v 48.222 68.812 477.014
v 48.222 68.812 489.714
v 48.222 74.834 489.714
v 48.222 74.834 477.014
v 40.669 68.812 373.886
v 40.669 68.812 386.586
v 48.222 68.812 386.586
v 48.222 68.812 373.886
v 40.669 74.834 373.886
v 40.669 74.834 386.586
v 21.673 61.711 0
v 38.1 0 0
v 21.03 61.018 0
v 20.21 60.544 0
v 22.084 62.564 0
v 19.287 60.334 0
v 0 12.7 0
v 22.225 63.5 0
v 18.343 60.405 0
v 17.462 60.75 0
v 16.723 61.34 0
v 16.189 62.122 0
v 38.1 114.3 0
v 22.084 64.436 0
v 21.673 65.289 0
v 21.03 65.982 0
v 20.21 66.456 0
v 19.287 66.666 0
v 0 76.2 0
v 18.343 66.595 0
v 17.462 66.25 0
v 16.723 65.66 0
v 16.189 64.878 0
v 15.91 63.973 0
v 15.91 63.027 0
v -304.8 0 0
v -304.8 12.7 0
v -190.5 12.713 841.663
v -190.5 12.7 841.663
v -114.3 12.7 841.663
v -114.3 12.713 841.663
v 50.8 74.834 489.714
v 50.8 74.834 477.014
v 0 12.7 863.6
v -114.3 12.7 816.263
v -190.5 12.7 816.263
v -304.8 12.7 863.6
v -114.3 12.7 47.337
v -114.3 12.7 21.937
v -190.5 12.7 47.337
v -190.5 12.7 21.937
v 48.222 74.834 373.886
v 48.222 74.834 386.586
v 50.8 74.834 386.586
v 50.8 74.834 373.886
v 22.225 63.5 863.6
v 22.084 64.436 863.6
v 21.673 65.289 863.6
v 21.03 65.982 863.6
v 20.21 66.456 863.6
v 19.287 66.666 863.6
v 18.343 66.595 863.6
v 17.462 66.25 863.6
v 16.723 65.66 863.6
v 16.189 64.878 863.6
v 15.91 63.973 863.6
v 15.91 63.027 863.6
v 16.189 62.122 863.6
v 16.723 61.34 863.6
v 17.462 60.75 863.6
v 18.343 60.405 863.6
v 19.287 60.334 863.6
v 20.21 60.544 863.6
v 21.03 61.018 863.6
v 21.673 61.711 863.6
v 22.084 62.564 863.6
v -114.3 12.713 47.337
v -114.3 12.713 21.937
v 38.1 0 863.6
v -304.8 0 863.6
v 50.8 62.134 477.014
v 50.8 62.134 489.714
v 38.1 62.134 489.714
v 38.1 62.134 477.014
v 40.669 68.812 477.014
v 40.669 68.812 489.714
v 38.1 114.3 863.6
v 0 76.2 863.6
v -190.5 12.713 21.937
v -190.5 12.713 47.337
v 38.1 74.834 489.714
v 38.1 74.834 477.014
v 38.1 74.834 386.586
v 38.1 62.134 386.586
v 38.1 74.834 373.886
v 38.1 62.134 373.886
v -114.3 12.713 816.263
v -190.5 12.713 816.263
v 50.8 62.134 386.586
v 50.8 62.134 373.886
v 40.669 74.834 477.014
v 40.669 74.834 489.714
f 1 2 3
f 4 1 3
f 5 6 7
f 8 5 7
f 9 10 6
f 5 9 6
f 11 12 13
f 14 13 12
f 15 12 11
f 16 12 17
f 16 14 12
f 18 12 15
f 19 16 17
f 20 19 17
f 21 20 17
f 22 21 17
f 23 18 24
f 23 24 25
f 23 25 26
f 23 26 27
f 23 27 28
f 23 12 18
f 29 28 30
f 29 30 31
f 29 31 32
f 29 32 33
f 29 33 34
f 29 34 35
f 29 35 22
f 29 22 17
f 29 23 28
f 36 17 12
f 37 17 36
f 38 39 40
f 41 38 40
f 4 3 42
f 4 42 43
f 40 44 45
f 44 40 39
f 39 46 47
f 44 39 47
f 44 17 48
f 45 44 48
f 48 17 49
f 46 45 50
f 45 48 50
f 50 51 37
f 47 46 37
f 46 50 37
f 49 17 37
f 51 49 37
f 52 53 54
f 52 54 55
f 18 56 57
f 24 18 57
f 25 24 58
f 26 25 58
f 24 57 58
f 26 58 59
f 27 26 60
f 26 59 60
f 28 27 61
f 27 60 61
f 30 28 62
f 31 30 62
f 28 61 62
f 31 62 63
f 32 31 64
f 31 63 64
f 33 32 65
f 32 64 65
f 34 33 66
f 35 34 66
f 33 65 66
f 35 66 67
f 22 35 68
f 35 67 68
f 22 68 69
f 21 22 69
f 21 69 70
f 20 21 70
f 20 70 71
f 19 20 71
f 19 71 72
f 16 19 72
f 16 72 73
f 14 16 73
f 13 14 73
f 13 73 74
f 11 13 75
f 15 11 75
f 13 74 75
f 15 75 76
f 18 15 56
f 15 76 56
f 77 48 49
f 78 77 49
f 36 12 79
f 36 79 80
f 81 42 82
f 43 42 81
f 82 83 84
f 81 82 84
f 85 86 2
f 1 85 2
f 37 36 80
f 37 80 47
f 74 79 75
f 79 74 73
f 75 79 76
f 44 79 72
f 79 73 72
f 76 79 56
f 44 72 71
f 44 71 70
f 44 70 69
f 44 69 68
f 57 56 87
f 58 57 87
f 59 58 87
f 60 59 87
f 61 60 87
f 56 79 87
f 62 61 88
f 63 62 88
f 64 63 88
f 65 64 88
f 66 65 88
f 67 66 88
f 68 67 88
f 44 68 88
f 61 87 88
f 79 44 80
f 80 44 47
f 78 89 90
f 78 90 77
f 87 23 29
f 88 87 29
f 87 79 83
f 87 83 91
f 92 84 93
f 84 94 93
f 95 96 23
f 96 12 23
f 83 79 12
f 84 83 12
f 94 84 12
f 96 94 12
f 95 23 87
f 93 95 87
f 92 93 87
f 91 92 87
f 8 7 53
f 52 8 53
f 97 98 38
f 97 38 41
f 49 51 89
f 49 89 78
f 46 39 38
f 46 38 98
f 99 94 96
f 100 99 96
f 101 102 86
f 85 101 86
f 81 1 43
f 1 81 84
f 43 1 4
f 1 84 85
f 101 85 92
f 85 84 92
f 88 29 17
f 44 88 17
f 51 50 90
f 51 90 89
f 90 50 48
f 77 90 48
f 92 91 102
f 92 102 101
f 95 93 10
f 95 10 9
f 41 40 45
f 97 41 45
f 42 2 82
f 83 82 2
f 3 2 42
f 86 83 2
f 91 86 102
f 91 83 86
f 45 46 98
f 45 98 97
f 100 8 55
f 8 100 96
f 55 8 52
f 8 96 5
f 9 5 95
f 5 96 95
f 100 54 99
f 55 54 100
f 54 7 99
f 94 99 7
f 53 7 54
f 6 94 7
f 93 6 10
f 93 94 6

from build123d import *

# Parameters (mm, degrees)
BOSS_EXTRUDE1_DEPTH = 863.6
SKETCH3_R           = 3.175
CUT_EXTRUDE1_DEPTH  = 863.6
SKETCH2_W           = 304.8
SKETCH2_H           = 12.7
BOSS_EXTRUDE5_DEPTH = 863.6
SKETCH5_W           = 76.2
SKETCH5_H           = 25.4
BOSS_EXTRUDE6_DEPTH = 0.0127
SKETCH6_W           = 12.7
SKETCH6_H           = 12.7
BOSS_EXTRUDE8_DEPTH = 12.7
CUT_EXTRUDE2_DEPTH  = 137.668


with BuildPart() as part:
    # Sketch1 → Boss-Extrude1 (new body)
    with BuildSketch(Plane.XY):
        Polygon((0, 0), (38.1, 0), (38.1, 114.3), (19.716081556, 95.916081556), (0, 76.2), align=None)
    extrude(amount=BOSS_EXTRUDE1_DEPTH)

    # Sketch3 → Cut-Extrude1 (cut)
    with BuildSketch(Plane.XY.offset(863.6)):
        with Locations((19.05, 63.5)):
            Circle(SKETCH3_R)
    extrude(amount=-CUT_EXTRUDE1_DEPTH, mode=Mode.SUBTRACT)

    # Sketch2 → Boss-Extrude5 (add)
    with BuildSketch(Plane(origin=(0, 0, 0), x_dir=(-1, 0, 0), z_dir=(0, 0, -1))):
        with Locations((152.4, 6.35)):
            Rectangle(SKETCH2_W, SKETCH2_H)
    extrude(amount=-BOSS_EXTRUDE5_DEPTH)

    # Sketch5 → Boss-Extrude6 (add)
    with BuildSketch(Plane(origin=(0, 12.7, 0), x_dir=(1, 0, 0), z_dir=(0, 1, 0))):
        with Locations((-152.4, -34.636758867)):
            Rectangle(SKETCH5_W, SKETCH5_H)
        with Locations((-152.4, -828.963241133)):
            Rectangle(SKETCH5_W, SKETCH5_H)
    extrude(amount=BOSS_EXTRUDE6_DEPTH)

    # Sketch6 → Boss-Extrude8 (add)
    with BuildSketch(Plane(origin=(38.1, 0, 0), x_dir=(0, 0, -1), z_dir=(1, 0, 0))):
        with Locations((-380.236111085, 68.484263382)):
            Rectangle(SKETCH6_W, SKETCH6_H)
        with Locations((-483.363888915, 68.484263382)):
            Rectangle(SKETCH6_W, SKETCH6_H)
    extrude(amount=BOSS_EXTRUDE8_DEPTH)

    # Sketch7 → Cut-Extrude2 (cut)
    with BuildSketch(Plane.XY.offset(489.713888915)):
        Polygon((44.45, 68.812070036), (48.222471195, 68.812070036), (48.222471195, 74.834263382), (40.668527222, 74.834263382), (40.668527222, 68.812070036), align=None)
    extrude(amount=-CUT_EXTRUDE2_DEPTH, mode=Mode.SUBTRACT)


solid = part.part
